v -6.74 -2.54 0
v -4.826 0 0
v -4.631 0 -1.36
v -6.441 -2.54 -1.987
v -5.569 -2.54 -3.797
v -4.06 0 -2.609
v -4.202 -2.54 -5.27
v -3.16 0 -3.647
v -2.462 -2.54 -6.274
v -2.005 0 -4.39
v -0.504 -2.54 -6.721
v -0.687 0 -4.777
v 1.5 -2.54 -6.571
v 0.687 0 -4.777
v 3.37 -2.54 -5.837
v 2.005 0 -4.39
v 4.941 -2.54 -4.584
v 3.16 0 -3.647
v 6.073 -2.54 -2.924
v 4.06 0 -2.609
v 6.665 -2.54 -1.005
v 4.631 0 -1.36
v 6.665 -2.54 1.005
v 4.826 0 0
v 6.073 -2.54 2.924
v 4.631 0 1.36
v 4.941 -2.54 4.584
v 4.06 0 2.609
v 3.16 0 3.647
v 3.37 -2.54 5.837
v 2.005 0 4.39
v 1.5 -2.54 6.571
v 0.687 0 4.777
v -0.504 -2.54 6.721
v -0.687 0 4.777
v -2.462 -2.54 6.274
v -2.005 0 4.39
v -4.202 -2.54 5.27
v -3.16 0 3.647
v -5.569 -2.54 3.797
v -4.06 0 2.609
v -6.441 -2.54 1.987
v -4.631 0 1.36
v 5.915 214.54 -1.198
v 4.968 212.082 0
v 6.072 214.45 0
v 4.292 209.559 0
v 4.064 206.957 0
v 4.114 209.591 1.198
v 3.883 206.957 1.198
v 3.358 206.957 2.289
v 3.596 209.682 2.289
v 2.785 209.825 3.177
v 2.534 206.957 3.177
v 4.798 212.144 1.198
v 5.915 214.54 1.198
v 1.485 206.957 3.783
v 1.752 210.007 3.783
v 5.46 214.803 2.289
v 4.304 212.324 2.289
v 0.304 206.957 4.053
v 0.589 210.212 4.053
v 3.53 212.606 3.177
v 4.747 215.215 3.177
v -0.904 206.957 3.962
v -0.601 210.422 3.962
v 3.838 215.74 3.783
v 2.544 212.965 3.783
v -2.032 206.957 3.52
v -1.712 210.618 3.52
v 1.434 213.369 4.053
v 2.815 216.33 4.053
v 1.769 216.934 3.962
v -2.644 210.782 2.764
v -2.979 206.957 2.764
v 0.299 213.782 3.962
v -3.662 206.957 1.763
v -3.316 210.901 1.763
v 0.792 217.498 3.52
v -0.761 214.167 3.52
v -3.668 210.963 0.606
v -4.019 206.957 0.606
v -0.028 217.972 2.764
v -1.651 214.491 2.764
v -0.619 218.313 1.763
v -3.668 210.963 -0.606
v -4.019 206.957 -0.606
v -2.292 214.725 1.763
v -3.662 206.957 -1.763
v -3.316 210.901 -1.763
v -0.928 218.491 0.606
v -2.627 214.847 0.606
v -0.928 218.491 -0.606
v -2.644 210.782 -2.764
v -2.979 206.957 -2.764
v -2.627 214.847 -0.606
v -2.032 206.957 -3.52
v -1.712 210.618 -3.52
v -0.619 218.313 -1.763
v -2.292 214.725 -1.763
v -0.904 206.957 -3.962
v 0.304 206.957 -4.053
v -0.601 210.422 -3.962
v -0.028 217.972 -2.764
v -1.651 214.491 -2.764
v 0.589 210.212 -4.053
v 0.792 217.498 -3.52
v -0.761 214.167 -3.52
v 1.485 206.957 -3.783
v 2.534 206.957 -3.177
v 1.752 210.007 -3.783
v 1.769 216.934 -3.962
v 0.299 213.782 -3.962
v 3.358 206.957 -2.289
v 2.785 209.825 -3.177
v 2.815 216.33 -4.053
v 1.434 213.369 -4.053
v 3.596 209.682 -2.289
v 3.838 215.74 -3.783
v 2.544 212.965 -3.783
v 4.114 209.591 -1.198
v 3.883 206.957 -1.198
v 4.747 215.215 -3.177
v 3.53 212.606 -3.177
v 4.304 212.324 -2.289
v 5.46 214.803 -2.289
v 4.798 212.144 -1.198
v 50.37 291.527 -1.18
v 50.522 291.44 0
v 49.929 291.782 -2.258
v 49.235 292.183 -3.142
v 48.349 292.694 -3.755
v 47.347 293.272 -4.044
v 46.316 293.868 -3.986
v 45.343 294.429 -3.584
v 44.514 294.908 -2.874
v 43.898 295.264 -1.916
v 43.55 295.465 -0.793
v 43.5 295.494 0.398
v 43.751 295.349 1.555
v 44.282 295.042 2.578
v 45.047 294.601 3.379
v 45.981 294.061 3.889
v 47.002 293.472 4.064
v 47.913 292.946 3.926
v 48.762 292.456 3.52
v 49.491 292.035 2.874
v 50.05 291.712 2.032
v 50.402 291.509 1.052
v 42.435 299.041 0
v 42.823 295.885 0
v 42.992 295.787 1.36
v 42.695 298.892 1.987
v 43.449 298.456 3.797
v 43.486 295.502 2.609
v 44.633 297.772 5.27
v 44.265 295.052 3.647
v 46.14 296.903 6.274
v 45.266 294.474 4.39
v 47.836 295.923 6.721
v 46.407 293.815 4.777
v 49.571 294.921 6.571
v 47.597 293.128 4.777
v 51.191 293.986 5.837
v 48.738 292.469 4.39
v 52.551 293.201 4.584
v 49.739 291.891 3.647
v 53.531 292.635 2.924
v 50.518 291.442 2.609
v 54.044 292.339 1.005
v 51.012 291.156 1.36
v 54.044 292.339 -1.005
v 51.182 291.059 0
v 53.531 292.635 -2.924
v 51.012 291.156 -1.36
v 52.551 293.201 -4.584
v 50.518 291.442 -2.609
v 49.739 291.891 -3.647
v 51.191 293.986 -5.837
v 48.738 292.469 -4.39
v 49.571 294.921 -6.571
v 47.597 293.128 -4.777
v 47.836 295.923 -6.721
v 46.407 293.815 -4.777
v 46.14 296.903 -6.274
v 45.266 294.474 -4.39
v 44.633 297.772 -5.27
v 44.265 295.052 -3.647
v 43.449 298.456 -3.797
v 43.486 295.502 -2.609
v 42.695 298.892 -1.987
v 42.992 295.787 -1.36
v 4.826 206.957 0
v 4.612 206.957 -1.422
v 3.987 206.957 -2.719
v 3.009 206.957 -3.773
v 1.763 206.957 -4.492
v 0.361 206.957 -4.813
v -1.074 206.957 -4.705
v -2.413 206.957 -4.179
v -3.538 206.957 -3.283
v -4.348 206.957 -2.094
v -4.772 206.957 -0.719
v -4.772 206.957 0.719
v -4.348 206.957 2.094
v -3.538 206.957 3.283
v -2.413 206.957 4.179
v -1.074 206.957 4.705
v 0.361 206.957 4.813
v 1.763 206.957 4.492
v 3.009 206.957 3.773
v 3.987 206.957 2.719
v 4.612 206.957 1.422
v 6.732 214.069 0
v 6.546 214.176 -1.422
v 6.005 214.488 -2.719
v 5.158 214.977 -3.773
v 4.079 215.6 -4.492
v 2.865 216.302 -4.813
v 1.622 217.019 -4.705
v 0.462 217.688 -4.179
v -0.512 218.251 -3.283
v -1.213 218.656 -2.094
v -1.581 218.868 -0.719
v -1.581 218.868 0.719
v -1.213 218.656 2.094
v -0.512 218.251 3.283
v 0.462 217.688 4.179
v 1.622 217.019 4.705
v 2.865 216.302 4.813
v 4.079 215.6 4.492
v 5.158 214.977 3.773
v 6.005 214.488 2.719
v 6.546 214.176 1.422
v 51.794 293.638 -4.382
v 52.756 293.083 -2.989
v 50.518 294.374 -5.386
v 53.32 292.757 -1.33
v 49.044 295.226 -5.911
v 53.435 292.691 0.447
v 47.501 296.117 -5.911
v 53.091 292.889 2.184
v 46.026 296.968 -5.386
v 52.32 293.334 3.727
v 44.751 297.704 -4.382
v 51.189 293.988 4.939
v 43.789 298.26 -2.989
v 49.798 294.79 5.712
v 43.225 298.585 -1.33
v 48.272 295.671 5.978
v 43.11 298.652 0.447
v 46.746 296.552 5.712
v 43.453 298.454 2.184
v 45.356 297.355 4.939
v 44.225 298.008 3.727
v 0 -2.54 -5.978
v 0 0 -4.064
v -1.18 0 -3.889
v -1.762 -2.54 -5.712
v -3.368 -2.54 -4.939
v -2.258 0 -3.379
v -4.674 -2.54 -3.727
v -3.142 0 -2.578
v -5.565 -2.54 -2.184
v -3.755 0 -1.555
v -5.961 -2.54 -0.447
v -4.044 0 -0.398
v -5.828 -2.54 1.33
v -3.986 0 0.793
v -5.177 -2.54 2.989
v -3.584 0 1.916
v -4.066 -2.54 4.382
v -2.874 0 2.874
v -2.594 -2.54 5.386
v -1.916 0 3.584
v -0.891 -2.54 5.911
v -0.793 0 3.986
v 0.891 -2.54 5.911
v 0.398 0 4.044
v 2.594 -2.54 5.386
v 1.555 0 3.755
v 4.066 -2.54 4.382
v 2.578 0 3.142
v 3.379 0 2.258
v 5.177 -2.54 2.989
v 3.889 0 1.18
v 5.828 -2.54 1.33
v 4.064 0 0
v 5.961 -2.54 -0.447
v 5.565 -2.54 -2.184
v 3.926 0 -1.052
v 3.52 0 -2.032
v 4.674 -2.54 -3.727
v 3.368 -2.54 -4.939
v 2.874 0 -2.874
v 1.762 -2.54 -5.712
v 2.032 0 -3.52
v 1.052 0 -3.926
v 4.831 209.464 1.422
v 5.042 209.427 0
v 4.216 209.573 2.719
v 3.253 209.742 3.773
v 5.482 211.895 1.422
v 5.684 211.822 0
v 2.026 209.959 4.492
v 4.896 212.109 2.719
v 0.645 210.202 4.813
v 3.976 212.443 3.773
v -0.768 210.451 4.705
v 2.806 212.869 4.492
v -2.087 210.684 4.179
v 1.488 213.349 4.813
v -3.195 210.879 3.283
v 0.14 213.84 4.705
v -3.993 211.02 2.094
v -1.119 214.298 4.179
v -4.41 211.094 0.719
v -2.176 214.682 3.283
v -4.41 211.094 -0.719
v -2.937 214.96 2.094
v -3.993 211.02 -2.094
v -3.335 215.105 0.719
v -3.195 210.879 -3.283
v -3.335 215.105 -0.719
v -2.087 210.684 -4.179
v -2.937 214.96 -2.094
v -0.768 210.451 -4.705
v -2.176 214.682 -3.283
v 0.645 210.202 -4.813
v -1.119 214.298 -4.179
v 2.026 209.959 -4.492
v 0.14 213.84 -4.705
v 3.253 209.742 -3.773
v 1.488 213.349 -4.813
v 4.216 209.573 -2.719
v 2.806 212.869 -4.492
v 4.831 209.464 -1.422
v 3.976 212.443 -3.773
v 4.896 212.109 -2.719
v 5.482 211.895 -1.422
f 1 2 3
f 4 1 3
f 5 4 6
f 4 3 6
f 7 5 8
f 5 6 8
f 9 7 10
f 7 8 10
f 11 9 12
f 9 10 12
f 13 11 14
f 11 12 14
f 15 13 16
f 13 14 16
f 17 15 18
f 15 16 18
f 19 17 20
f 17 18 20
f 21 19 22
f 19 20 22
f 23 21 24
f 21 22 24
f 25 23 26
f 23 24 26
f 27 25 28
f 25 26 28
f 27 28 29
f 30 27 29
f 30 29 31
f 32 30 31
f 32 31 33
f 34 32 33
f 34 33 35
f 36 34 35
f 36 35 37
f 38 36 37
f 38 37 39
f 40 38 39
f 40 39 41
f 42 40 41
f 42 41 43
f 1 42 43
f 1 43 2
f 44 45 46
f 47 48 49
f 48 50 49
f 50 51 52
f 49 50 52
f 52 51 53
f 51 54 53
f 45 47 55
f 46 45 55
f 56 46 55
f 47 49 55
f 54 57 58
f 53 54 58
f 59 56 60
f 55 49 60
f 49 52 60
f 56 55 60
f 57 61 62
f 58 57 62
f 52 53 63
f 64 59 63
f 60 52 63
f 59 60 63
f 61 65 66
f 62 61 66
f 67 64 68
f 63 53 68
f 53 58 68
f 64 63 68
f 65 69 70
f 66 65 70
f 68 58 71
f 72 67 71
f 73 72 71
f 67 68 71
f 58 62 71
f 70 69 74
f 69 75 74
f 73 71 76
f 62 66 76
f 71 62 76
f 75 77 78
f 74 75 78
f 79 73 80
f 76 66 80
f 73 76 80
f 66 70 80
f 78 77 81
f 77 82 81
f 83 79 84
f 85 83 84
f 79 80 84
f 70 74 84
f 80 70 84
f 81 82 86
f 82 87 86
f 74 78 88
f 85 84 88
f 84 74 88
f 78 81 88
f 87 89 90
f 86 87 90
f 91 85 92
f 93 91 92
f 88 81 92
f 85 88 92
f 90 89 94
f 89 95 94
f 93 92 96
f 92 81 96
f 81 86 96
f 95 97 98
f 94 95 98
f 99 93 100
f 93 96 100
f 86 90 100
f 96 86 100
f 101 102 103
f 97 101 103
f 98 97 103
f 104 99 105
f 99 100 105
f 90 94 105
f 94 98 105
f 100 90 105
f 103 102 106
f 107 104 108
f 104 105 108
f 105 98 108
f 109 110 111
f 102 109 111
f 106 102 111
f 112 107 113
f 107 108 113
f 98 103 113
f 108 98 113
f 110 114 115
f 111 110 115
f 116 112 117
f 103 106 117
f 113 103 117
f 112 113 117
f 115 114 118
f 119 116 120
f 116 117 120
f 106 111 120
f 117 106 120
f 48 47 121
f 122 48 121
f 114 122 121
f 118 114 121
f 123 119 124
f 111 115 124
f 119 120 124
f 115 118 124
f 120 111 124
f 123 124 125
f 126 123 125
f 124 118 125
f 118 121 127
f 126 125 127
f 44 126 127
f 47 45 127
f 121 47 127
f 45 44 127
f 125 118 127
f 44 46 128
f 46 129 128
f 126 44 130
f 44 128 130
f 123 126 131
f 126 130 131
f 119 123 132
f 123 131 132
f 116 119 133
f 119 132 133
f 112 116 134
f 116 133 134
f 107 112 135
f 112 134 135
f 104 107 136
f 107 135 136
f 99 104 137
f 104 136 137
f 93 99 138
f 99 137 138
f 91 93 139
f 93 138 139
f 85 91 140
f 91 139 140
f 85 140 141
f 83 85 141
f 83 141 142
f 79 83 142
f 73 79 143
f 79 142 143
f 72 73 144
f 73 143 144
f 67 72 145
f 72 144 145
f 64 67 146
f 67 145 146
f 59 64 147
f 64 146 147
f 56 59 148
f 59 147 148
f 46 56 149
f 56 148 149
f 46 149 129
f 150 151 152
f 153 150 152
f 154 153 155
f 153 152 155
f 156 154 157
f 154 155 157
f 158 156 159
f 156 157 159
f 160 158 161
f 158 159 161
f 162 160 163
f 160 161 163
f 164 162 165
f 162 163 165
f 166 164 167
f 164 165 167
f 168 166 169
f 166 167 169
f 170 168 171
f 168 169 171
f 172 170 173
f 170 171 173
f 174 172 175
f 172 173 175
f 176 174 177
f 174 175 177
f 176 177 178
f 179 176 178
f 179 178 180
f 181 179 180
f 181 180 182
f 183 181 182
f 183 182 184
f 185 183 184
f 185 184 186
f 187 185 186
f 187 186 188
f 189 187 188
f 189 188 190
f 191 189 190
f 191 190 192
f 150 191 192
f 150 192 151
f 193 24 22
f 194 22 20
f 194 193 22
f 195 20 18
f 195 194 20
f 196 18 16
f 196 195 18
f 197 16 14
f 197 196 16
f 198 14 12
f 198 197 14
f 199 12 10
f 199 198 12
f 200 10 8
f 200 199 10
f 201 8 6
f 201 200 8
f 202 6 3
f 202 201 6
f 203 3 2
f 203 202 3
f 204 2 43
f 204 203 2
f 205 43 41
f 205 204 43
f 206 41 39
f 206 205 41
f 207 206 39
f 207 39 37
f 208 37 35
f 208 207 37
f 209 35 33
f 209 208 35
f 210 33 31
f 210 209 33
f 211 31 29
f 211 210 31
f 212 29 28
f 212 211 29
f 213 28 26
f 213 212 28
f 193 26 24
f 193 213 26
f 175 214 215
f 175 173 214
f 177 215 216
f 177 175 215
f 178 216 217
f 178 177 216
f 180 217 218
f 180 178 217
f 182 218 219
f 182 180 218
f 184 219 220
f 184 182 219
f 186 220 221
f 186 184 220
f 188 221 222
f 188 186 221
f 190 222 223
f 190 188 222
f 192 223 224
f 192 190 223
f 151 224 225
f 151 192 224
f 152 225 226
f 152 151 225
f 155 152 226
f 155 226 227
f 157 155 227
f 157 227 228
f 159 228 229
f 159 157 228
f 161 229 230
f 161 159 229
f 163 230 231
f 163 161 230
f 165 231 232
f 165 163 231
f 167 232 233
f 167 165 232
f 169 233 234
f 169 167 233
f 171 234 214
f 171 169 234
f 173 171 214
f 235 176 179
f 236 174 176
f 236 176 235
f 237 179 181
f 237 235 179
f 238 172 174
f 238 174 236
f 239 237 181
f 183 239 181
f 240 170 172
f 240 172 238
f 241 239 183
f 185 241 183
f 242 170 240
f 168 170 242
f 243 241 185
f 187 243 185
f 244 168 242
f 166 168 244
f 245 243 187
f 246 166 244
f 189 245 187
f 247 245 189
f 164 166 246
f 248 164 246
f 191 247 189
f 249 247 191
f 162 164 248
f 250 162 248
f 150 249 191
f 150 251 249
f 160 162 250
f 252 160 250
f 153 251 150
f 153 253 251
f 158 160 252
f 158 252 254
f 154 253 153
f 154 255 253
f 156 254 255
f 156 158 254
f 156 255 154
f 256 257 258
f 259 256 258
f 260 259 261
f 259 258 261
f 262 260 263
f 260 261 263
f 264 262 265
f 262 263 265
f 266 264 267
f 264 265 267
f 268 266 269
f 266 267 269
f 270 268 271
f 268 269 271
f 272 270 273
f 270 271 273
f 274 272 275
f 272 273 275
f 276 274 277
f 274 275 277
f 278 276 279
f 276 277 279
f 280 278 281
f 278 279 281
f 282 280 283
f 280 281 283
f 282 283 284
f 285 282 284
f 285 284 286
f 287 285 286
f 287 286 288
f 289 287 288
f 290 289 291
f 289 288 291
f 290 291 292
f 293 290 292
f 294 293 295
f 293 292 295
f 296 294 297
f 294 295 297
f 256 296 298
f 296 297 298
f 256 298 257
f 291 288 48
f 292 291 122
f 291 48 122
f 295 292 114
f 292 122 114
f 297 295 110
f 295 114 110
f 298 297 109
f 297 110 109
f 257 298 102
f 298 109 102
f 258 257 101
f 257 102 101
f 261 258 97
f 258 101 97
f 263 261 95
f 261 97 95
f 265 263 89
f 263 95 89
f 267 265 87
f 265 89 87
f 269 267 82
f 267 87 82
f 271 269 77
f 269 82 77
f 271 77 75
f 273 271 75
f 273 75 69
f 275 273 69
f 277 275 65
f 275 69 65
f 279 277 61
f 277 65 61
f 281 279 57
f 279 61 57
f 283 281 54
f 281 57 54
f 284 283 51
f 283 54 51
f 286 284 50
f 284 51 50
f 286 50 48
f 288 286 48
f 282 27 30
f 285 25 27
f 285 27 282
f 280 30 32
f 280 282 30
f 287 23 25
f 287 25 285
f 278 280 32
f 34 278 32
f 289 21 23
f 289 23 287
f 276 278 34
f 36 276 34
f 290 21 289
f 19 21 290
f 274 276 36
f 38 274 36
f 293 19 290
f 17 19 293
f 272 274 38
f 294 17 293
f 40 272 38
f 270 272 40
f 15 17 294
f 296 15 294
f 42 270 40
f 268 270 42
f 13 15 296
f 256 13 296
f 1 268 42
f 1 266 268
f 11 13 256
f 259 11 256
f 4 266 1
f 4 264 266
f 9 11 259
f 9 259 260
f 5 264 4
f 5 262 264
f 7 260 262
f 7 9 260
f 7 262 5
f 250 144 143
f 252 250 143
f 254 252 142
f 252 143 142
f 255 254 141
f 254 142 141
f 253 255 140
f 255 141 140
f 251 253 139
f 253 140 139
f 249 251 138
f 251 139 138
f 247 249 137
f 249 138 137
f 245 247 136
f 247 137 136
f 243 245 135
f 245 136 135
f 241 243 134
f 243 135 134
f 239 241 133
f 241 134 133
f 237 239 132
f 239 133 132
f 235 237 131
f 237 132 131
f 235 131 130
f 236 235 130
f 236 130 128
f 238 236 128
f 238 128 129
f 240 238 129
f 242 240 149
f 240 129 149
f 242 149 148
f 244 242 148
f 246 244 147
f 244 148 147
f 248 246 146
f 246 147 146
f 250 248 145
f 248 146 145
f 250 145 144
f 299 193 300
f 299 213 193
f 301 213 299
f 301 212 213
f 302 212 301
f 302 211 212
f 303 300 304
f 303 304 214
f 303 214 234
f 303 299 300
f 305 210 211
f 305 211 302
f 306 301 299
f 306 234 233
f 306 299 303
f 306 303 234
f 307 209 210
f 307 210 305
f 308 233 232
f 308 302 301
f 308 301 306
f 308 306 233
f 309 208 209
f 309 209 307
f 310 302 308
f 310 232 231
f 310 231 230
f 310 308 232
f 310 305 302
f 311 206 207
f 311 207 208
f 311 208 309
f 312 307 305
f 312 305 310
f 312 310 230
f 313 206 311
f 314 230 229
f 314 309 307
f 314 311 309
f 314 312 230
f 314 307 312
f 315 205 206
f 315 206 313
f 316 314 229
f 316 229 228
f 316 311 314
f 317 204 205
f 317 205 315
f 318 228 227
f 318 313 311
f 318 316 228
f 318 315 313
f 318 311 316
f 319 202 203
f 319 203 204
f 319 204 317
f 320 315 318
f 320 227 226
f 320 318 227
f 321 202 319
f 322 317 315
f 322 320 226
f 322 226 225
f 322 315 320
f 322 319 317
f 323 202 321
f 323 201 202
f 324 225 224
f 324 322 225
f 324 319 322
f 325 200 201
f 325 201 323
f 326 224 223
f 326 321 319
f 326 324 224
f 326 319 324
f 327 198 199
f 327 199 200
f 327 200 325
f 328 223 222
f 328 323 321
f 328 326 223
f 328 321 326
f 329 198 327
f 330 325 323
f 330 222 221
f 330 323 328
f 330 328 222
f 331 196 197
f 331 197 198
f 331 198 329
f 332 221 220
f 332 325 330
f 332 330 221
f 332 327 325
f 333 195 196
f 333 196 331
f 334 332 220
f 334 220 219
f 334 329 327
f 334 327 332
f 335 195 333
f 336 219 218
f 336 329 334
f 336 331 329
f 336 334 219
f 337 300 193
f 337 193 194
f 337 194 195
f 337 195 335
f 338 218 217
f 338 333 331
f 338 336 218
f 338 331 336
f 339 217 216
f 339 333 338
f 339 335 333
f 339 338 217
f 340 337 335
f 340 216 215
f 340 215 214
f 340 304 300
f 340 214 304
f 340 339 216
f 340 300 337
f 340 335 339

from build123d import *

# Parameters (mm, degrees)
SKETCH1_R           = 4.826
SKETCH1_R_2         = 4.064
SKETCH3_R           = 4.826
BOSS_EXTRUDE1_DEPTH = 2.54
BOSS_EXTRUDE1_DRAFT = -37
SKETCH5_R           = 4.826
BOSS_EXTRUDE2_DEPTH = 2.54
BOSS_EXTRUDE2_DRAFT = -37


with BuildPart() as part:
    # Sweep1: sweep along a path in Sketch2
    with BuildLine(Plane.XY) as sweep1_path:
        Line((0, 0), (0, 206.956941604))
        ThreePointArc((0, 206.956941604), (0.649113009, 211.887444413), (2.552216058, 216.481941604))
        Line((2.552216058, 216.481941604), (47.002216058, 293.4716))
    # Sketch1 → Sweep1 (sweep)
    with BuildSketch(Plane(origin=(0, 0, 0), x_dir=(1, 0, 0), z_dir=(0, 1, 0))):
        Circle(SKETCH1_R)
        Circle(SKETCH1_R_2, mode=Mode.SUBTRACT)
    sweep(path=sweep1_path.line)


with BuildPart() as boss_extrude1_tool:
    # Sketch3 → Boss-Extrude1 (with draft: the straight prism first)
    with BuildSketch(Plane.XZ):
        with Locations(Location((0, 0, 0), (0, 0, 180))):
            Circle(SKETCH3_R)
    extrude(amount=BOSS_EXTRUDE1_DEPTH)
    # Boss-Extrude1: the draft: its side faces are tilted about the plane it starts from
    boss_extrude1_sides = [boss_extrude1_tool.faces().sort_by_distance(p)[0] for p in [
        (4.826, -1.27, 0),
    ]]
    draft(boss_extrude1_sides, Plane.XZ, BOSS_EXTRUDE1_DRAFT)


with BuildPart() as part_1:
    add(part.part)

    # Boss-Extrude1: add boss_extrude1_tool
    add(boss_extrude1_tool.part)

    # Cut-Extrude1 cone 1 section (through the dimple's axis) → Cut-Extrude1 (revolve, cut)
    with BuildSketch(Plane(origin=(0, -2.54, 0), x_dir=(0, 0, -1), z_dir=(1, 0, 0))):
        Polygon((0, 0), (5.978027287, 0), (0, 7.933110155), align=None)
    revolve(axis=Axis((0, -2.54, 0), (0, 1, 0)), mode=Mode.SUBTRACT)


with BuildPart() as boss_extrude2_tool:
    # Sketch5 → Boss-Extrude2 (with draft: the straight prism first)
    with BuildSketch(Plane(origin=(138.827484459, 240.45625657, 0), x_dir=(0, 0, -1), z_dir=(0.5000000000000008, 0.8660254037844382, 0))):
        with Locations(Location((0, 106.03068686, 0), (0, 0, 90))):
            Circle(SKETCH5_R)
    extrude(amount=BOSS_EXTRUDE2_DEPTH)
    # Boss-Extrude2: the draft: its side faces are tilted about the plane it starts from
    boss_extrude2_sides = [boss_extrude2_tool.faces().sort_by_distance(p)[0] for p in [
        (51.816654657, 292.158452263, 0),
    ]]
    draft(boss_extrude2_sides, Plane(origin=(138.827484459, 240.45625657, 0), x_dir=(0, 0, -1), z_dir=(0.5000000000000008, 0.8660254037844382, 0)), BOSS_EXTRUDE2_DRAFT)


with BuildPart() as part_2:
    add(part_1.part)

    # Boss-Extrude2: add boss_extrude2_tool
    add(boss_extrude2_tool.part)

    # Cut-Extrude2 cone 1 section (through the dimple's axis) → Cut-Extrude2 (revolve, cut)
    with BuildSketch(Plane(origin=(48.272216058, 295.671304526, 0), x_dir=(0, 0, 1), z_dir=(0.866025404, -0.5, 0))):
        Polygon((0, 0), (5.978027287, 0), (0, 7.933110155), align=None)
    revolve(axis=Axis((48.272216058, 295.671304526, 0), (-0.5, -0.866025404, 0)), mode=Mode.SUBTRACT)


solid = part_2.part
